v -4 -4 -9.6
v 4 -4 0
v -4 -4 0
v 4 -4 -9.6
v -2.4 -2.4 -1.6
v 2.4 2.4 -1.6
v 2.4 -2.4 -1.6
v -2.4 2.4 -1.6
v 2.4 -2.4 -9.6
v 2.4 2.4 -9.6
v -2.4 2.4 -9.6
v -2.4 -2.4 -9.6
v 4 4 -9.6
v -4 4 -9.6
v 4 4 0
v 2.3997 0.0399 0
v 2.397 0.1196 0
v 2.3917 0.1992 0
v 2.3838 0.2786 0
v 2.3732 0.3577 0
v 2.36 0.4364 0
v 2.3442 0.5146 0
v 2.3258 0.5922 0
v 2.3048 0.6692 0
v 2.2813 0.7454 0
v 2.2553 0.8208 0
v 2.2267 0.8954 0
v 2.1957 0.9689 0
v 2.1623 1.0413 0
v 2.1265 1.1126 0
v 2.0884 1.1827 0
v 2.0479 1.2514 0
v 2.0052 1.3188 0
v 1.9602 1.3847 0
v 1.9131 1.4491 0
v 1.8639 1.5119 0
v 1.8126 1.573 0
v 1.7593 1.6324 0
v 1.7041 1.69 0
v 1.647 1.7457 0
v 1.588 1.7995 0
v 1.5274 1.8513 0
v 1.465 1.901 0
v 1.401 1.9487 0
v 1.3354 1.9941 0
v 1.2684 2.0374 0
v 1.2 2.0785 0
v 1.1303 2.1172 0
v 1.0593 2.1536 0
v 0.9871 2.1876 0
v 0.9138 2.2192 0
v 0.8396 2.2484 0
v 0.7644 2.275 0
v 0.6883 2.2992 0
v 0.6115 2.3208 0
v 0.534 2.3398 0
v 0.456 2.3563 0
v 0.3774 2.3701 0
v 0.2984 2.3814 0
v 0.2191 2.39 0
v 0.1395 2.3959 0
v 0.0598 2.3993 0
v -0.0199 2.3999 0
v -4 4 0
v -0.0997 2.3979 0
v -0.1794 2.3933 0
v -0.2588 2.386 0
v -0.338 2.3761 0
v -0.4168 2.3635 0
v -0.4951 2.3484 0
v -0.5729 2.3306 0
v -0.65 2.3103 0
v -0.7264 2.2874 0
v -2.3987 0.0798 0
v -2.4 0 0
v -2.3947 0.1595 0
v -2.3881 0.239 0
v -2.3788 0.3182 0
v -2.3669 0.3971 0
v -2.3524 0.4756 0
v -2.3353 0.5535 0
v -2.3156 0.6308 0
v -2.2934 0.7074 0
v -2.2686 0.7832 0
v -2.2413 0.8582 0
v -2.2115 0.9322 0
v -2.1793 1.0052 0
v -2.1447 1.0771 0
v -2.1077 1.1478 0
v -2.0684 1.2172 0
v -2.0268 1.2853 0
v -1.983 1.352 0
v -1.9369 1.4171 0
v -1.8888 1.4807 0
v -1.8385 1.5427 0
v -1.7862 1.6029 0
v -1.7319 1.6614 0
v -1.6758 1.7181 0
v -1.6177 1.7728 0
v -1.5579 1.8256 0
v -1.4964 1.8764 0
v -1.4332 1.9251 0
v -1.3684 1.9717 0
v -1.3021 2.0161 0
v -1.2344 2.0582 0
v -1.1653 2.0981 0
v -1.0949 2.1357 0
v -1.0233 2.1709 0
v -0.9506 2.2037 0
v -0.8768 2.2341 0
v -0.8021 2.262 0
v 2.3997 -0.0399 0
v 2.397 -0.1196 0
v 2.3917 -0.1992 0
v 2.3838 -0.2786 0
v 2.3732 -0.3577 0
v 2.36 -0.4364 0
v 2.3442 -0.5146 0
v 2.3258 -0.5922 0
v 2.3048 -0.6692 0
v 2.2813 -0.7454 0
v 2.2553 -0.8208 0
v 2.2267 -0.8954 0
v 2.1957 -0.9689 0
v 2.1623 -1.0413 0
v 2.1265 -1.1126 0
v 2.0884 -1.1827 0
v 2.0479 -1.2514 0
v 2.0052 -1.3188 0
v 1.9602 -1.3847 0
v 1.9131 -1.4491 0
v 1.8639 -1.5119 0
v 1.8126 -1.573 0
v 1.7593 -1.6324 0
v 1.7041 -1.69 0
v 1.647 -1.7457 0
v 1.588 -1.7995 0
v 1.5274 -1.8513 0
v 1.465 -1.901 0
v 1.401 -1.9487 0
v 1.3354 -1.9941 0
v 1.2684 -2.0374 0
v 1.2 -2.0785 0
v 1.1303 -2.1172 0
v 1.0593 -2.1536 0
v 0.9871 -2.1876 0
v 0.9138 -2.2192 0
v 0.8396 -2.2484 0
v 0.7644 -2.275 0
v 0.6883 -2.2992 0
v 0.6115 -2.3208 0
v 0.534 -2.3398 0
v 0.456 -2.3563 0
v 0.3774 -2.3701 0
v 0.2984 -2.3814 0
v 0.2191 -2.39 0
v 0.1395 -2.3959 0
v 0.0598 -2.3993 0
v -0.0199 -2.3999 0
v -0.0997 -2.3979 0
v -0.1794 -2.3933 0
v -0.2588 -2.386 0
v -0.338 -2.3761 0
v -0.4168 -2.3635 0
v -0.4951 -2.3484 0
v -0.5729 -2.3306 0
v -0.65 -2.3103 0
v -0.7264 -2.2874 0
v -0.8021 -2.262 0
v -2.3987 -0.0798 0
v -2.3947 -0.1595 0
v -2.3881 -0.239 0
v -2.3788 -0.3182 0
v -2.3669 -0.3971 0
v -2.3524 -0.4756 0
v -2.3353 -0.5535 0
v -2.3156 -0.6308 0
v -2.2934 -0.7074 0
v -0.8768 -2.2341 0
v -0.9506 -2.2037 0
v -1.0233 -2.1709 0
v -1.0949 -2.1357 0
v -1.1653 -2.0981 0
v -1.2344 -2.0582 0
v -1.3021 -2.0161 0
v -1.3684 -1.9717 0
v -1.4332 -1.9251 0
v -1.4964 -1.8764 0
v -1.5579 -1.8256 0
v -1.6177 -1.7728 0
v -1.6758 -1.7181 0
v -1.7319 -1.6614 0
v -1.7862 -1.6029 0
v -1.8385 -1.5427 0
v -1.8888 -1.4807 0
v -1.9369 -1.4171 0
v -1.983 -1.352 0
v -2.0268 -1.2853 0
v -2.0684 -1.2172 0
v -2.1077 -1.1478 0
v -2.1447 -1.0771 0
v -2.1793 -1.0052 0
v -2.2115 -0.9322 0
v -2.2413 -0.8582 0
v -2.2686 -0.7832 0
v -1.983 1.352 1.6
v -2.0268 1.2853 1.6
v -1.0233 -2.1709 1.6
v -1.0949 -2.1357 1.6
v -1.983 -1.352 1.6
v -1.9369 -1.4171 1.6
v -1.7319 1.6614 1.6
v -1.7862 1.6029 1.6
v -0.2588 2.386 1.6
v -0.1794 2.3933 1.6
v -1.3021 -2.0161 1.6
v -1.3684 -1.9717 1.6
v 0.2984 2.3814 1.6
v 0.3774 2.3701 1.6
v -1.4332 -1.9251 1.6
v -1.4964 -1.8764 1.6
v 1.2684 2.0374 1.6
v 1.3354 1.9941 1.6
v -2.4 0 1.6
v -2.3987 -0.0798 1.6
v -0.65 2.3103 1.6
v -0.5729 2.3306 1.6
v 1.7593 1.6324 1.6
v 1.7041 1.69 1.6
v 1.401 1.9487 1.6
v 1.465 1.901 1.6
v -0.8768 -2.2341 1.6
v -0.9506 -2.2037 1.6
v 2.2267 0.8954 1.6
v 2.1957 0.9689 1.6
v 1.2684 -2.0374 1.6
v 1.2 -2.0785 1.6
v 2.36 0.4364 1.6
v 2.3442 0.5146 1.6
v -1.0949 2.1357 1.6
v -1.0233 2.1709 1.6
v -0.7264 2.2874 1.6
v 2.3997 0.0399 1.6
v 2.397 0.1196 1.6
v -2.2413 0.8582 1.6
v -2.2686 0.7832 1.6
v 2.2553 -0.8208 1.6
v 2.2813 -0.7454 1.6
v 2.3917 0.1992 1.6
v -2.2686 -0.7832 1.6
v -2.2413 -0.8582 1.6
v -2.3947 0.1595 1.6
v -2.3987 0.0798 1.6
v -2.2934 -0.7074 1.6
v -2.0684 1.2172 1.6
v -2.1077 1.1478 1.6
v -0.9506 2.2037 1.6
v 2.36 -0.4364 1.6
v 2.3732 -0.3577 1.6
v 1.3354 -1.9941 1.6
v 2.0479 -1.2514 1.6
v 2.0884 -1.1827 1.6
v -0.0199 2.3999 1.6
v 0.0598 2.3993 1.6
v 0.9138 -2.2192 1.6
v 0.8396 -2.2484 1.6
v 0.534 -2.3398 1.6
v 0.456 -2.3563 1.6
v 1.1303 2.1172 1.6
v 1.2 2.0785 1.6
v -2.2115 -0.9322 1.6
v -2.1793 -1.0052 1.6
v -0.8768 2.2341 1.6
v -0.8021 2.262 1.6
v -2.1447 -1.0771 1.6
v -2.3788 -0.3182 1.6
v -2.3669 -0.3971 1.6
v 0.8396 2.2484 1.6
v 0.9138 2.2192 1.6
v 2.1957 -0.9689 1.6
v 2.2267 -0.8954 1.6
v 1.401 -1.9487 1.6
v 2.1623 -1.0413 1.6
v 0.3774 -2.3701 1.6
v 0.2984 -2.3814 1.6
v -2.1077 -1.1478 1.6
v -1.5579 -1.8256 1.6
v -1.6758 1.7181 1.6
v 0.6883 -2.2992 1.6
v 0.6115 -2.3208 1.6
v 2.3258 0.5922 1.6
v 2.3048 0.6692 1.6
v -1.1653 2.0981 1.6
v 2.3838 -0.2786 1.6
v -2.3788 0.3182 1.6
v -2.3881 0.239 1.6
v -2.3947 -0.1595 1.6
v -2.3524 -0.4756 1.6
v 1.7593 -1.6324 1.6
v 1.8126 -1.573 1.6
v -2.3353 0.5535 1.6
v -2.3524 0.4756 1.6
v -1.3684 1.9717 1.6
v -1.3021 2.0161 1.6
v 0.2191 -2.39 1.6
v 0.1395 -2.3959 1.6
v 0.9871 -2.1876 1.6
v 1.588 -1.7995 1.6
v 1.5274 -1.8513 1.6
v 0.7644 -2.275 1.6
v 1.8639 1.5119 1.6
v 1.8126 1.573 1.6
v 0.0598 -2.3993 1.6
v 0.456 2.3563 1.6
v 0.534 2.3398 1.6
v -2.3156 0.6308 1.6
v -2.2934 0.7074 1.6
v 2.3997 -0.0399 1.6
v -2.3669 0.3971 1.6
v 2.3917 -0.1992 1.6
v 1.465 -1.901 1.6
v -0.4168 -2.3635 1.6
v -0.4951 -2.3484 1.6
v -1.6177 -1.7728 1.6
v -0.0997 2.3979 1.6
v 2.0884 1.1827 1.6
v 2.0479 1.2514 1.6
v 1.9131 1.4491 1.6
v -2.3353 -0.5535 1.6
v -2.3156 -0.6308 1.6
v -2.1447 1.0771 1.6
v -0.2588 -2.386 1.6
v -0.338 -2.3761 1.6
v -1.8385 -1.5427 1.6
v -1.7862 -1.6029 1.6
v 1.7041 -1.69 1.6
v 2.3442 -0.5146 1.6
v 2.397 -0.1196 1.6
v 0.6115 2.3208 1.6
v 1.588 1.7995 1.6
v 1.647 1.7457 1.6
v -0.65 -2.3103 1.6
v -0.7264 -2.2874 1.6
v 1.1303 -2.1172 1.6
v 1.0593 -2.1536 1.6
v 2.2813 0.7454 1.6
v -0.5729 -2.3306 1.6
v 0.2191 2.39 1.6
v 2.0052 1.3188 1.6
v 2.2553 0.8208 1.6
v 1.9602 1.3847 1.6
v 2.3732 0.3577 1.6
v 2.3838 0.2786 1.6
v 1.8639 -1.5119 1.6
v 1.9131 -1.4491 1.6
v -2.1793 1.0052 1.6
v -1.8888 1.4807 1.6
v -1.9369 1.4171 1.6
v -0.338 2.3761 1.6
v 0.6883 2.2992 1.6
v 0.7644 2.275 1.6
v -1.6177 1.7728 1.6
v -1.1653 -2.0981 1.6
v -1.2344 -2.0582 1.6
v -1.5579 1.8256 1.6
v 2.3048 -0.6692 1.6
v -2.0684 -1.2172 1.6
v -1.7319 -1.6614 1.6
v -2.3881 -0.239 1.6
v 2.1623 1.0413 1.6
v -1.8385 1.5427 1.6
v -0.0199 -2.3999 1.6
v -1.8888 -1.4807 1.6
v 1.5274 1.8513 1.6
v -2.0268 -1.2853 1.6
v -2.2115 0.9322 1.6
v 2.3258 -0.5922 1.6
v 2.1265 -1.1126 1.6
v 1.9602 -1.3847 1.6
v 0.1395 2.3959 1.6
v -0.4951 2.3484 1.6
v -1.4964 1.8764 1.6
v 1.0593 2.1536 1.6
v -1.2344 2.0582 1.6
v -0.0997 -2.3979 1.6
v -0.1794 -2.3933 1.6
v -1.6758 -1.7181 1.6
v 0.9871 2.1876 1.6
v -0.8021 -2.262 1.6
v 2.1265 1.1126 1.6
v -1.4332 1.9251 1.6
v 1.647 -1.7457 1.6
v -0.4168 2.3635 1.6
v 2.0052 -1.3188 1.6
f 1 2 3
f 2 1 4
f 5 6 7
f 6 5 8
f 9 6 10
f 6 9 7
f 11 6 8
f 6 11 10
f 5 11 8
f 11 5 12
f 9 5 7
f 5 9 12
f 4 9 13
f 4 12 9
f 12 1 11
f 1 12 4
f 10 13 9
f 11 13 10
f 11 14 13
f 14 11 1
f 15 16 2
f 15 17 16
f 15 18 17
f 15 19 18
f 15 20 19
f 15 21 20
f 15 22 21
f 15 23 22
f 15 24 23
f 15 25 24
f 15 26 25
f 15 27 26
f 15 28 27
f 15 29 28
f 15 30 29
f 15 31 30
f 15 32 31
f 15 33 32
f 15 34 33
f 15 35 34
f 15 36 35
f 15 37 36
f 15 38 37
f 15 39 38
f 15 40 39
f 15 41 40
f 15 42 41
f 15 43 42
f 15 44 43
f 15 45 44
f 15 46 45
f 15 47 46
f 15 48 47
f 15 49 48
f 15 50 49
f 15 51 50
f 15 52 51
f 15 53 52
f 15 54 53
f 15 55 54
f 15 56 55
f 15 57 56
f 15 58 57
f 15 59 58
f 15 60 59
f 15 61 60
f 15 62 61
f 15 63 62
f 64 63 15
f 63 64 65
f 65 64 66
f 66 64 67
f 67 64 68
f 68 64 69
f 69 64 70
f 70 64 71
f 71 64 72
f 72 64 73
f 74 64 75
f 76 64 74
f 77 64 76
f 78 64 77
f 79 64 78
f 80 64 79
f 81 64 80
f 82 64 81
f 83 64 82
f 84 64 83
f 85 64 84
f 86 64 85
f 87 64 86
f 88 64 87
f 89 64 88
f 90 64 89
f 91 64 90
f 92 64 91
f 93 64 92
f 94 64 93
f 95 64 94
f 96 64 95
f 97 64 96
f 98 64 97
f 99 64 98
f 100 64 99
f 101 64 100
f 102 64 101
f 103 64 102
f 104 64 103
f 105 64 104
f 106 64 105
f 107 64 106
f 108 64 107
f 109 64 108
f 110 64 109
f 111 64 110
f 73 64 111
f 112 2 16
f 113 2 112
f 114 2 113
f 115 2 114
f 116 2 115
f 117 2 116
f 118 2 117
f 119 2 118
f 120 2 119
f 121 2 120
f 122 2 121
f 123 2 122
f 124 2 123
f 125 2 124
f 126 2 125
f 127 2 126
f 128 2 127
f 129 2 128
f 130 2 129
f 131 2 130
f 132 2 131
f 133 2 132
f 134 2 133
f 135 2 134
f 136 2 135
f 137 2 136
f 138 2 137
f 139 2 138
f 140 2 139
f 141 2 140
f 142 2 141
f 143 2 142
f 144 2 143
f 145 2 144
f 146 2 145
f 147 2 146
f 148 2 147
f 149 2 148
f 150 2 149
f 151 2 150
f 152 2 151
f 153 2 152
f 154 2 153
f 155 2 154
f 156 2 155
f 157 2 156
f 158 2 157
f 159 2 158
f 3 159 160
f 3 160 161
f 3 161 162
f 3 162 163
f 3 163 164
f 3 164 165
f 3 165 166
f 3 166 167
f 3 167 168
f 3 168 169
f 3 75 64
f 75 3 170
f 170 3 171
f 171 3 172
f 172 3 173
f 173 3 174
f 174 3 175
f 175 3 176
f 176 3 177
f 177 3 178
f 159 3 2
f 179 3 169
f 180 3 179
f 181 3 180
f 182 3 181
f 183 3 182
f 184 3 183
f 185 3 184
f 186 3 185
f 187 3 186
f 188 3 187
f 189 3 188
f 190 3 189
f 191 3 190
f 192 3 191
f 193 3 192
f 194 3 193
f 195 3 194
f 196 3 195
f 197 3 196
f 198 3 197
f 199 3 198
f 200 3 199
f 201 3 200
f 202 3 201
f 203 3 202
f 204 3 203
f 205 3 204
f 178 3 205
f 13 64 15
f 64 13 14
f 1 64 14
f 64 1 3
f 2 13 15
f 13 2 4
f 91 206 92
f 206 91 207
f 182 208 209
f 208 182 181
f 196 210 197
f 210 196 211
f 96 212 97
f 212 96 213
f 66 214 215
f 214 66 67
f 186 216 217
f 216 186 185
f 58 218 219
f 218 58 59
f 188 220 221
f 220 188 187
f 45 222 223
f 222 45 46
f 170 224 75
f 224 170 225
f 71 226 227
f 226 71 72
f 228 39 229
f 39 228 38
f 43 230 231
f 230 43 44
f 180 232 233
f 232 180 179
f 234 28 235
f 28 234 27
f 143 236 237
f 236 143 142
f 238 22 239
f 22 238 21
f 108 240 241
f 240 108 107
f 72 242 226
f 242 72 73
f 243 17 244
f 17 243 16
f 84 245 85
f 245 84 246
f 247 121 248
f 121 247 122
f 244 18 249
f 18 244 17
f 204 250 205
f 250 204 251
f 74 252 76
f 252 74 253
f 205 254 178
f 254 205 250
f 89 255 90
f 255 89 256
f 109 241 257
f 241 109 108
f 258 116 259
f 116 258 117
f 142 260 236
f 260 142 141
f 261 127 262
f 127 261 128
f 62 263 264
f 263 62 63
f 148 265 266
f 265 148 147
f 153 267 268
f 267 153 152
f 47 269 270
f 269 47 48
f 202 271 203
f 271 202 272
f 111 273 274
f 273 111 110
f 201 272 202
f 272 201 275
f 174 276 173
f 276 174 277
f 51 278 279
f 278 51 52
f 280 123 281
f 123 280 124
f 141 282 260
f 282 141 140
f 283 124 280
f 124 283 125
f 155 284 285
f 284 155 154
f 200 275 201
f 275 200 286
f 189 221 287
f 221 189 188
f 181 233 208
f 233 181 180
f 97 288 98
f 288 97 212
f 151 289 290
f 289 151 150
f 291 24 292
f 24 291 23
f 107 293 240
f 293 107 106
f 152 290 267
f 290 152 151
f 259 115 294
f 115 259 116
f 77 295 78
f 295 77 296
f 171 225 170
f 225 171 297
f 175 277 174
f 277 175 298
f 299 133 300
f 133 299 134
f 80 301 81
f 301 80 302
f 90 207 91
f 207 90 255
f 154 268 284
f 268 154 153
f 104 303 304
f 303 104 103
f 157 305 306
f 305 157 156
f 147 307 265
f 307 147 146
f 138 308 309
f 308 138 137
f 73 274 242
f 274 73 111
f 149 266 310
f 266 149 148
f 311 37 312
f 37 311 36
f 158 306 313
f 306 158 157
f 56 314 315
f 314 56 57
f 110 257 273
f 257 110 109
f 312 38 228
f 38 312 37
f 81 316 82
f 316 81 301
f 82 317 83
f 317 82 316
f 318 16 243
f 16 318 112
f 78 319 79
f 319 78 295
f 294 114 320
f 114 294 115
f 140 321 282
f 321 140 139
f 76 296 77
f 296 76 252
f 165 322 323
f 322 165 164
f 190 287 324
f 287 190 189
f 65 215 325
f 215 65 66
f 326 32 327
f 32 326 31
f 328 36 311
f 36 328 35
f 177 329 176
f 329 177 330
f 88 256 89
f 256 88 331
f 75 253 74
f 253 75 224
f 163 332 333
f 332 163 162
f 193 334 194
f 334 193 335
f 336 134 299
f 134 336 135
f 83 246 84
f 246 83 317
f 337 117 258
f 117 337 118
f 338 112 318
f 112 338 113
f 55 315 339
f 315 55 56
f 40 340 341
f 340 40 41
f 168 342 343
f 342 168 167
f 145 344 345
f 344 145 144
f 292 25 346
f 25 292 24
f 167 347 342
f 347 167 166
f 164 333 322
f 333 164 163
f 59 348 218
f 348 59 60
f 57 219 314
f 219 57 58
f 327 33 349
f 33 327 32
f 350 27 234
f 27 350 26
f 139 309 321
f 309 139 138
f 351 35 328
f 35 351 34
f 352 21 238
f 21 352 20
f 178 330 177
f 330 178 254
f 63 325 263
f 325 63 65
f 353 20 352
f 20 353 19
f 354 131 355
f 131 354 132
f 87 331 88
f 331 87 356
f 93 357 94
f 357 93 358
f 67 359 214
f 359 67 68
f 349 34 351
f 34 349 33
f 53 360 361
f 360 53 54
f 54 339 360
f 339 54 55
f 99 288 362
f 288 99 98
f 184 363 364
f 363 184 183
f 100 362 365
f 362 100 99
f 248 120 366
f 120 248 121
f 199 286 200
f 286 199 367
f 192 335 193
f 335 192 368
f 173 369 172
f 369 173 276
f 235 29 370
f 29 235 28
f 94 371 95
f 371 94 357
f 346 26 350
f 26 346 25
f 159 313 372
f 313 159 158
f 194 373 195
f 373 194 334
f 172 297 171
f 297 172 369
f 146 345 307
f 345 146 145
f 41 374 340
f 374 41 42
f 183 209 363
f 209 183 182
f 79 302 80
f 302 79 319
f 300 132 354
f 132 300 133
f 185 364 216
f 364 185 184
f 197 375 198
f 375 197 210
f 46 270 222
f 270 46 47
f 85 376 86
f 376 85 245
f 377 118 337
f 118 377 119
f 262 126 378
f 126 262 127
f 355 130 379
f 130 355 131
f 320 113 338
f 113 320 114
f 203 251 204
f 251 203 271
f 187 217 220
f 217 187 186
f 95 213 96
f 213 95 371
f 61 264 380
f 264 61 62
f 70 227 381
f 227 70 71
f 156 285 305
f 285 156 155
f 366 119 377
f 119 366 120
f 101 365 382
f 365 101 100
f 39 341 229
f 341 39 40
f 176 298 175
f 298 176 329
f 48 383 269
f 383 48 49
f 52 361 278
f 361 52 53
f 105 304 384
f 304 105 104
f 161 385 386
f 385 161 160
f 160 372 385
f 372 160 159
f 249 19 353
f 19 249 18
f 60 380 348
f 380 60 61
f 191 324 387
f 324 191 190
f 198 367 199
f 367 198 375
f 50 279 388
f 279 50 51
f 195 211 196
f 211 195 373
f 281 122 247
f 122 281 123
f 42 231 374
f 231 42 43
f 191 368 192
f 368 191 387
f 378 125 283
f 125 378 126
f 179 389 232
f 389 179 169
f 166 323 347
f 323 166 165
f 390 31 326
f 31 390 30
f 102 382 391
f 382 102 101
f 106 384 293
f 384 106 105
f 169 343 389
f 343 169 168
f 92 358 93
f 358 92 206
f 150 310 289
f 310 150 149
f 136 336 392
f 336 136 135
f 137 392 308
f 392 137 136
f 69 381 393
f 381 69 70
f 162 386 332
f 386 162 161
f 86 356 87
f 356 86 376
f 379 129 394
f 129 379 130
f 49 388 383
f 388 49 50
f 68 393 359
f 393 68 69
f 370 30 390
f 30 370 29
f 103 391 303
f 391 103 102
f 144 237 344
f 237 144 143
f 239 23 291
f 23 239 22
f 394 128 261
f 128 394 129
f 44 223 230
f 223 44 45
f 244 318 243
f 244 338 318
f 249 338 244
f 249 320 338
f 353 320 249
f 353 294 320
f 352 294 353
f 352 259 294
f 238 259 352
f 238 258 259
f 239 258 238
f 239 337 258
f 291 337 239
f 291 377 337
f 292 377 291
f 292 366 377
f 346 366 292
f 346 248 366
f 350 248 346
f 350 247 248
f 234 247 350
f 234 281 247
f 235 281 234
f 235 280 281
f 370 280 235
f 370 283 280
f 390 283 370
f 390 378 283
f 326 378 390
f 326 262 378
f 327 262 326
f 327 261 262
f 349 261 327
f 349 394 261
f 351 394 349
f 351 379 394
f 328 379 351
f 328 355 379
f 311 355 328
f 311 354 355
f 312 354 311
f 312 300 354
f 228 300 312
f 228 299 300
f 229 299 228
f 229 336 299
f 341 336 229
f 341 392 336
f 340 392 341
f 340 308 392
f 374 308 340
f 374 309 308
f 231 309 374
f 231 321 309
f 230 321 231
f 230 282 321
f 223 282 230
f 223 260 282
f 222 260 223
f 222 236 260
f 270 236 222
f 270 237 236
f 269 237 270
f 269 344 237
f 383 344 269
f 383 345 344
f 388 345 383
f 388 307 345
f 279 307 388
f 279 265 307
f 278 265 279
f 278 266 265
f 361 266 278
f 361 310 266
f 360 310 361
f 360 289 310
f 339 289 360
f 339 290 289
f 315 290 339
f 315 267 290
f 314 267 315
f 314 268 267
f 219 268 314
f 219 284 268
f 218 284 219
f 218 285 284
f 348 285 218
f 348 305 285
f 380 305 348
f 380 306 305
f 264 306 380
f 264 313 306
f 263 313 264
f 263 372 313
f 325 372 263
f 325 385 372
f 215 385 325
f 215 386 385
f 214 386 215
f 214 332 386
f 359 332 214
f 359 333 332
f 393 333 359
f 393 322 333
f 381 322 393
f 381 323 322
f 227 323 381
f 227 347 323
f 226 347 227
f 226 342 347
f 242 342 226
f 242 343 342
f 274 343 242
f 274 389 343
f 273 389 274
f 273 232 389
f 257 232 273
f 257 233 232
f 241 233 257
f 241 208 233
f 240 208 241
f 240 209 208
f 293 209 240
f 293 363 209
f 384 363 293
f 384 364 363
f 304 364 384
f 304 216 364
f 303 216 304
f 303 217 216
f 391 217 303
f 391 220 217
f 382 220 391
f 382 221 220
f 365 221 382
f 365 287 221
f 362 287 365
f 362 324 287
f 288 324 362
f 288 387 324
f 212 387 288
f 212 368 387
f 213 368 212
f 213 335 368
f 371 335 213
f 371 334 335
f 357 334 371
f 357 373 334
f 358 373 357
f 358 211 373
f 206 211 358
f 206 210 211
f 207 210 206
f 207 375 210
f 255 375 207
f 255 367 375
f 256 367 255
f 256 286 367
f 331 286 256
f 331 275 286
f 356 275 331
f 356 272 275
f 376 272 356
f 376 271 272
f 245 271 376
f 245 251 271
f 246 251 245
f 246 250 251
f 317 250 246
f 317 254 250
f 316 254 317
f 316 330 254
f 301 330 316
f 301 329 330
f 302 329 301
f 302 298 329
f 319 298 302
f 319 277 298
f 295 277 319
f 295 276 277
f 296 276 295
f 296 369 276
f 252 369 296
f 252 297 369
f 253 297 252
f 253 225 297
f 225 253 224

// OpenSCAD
// file: ../p/4-4edge.scad
use <../lib.scad>
$fa=1; $fs=0.2;
function ldraw_lib__4_4edge(realsolid=false) = [
// 0 Circle 1.0
// 0 Name: 4-4edge.dat
// 0 Author: James Jessiman
// 0 !LDRAW_ORG Primitive UPDATE 2017-01
// 0 !LICENSE Licensed under CC BY 2.0 and CC BY 4.0 : see CAreadme.txt
// 
// 0 BFC CERTIFY CCW
  [0,"BFC","CERTIFY"],
  [0,"BFC","CCW"],
// 
// 0 !HISTORY 1998-12-15 [PTadmin] Official Update 1998-10
// 0 !HISTORY 2005-12-28 [PTadmin] Official Update 2005-01
// 0 !HISTORY 2007-06-24 [PTadmin] Header formatted for Contributor Agreement
// 0 !HISTORY 2008-07-01 [PTadmin] Official Update 2008-01
// 0 !HISTORY 2017-01-15 [Steffen] BFCed
// 0 !HISTORY 2017-12-30 [PTadmin] Official Update 2017-01
// 
// 
// 2 24 1 0 0 0.9239 0 0.3827
  [2,24,1,0,0,0.9239,0,0.3827],
// 2 24 0.9239 0 0.3827 0.7071 0 0.7071
  [2,24,0.9239,0,0.3827,0.7071,0,0.7071],
// 2 24 0.7071 0 0.7071 0.3827 0 0.9239
  [2,24,0.7071,0,0.7071,0.3827,0,0.9239],
// 2 24 0.3827 0 0.9239 0 0 1
  [2,24,0.3827,0,0.9239,0,0,1],
// 2 24 0 0 1 -0.3827 0 0.9239
  [2,24,0,0,1,-0.3827,0,0.9239],
// 2 24 -0.3827 0 0.9239 -0.7071 0 0.7071
  [2,24,-0.3827,0,0.9239,-0.7071,0,0.7071],
// 2 24 -0.7071 0 0.7071 -0.9239 0 0.3827
  [2,24,-0.7071,0,0.7071,-0.9239,0,0.3827],
// 2 24 -0.9239 0 0.3827 -1 0 -0
  [2,24,-0.9239,0,0.3827,-1,0,-0],
// 2 24 -1 0 -0 -0.9239 0 -0.3827
  [2,24,-1,0,-0,-0.9239,0,-0.3827],
// 2 24 -0.9239 0 -0.3827 -0.7071 0 -0.7071
  [2,24,-0.9239,0,-0.3827,-0.7071,0,-0.7071],
// 2 24 -0.7071 0 -0.7071 -0.3827 0 -0.9239
  [2,24,-0.7071,0,-0.7071,-0.3827,0,-0.9239],
// 2 24 -0.3827 0 -0.9239 0 0 -1
  [2,24,-0.3827,0,-0.9239,0,0,-1],
// 2 24 0 0 -1 0.3827 0 -0.9239
  [2,24,0,0,-1,0.3827,0,-0.9239],
// 2 24 0.3827 0 -0.9239 0.7071 0 -0.7071
  [2,24,0.3827,0,-0.9239,0.7071,0,-0.7071],
// 2 24 0.7071 0 -0.7071 0.9239 0 -0.3827
  [2,24,0.7071,0,-0.7071,0.9239,0,-0.3827],
// 2 24 0.9239 0 -0.3827 1 0 0
  [2,24,0.9239,0,-0.3827,1,0,0],
];
module ldraw_lib__4_4edge(step=0, col=false, unit=2/5, alt=false, line=0.2, solid=!$preview)
    makepoly(ldraw_lib__4_4edge(solid), step=step, col=col, unit=unit, alt=alt, line=line, solid=solid);
ldraw_lib__4_4edge(line=0.2);
// file: ../p/4-4disc.scad
use <../lib.scad>
$fa=1; $fs=0.2;
function ldraw_lib__4_4disc(realsolid=false) = [
// 0 Disc 1.0
// 0 Name: 4-4disc.dat
// 0 Author: James Jessiman
// 0 !LDRAW_ORG Primitive UPDATE 2002-02
// 0 !LICENSE Licensed under CC BY 2.0 and CC BY 4.0 : see CAreadme.txt
// 
// 0 BFC CERTIFY CCW
  [0,"BFC","CERTIFY"],
  [0,"BFC","CCW"],
// 
// 0 !HISTORY 1998-12-15 [PTadmin] Official Update 1998-10
// 0 !HISTORY 2002-03-23 [sbliss] Added BFC statement
// 0 !HISTORY 2002-04-25 [PTadmin] Official Update 2002-02
// 0 !HISTORY 2007-06-24 [PTadmin] Header formatted for Contributor Agreement
// 0 !HISTORY 2008-07-01 [PTadmin] Official Update 2008-01
// 
// 
// 3 16 0 0 0 1 0 0 0.9239 0 0.3827
  [3,16,0,0,0,1,0,0,0.9239,0,0.3827],
// 3 16 0 0 0 0.9239 0 0.3827 0.7071 0 0.7071
  [3,16,0,0,0,0.9239,0,0.3827,0.7071,0,0.7071],
// 3 16 0 0 0 0.7071 0 0.7071 0.3827 0 0.9239
  [3,16,0,0,0,0.7071,0,0.7071,0.3827,0,0.9239],
// 3 16 0 0 0 0.3827 0 0.9239 0 0 1
  [3,16,0,0,0,0.3827,0,0.9239,0,0,1],
// 3 16 0 0 0 0 0 1 -0.3827 0 0.9239
  [3,16,0,0,0,0,0,1,-0.3827,0,0.9239],
// 3 16 0 0 0 -0.3827 0 0.9239 -0.7071 0 0.7071
  [3,16,0,0,0,-0.3827,0,0.9239,-0.7071,0,0.7071],
// 3 16 0 0 0 -0.7071 0 0.7071 -0.9239 0 0.3827
  [3,16,0,0,0,-0.7071,0,0.7071,-0.9239,0,0.3827],
// 3 16 0 0 0 -0.9239 0 0.3827 -1 0 -0
  [3,16,0,0,0,-0.9239,0,0.3827,-1,0,-0],
// 3 16 0 0 0 -1 0 -0 -0.9239 0 -0.3827
  [3,16,0,0,0,-1,0,-0,-0.9239,0,-0.3827],
// 3 16 0 0 0 -0.9239 0 -0.3827 -0.7071 0 -0.7071
  [3,16,0,0,0,-0.9239,0,-0.3827,-0.7071,0,-0.7071],
// 3 16 0 0 0 -0.7071 0 -0.7071 -0.3827 0 -0.9239
  [3,16,0,0,0,-0.7071,0,-0.7071,-0.3827,0,-0.9239],
// 3 16 0 0 0 -0.3827 0 -0.9239 0 0 -1
  [3,16,0,0,0,-0.3827,0,-0.9239,0,0,-1],
// 3 16 0 0 0 0 0 -1 0.3827 0 -0.9239
  [3,16,0,0,0,0,0,-1,0.3827,0,-0.9239],
// 3 16 0 0 0 0.3827 0 -0.9239 0.7071 0 -0.7071
  [3,16,0,0,0,0.3827,0,-0.9239,0.7071,0,-0.7071],
// 3 16 0 0 0 0.7071 0 -0.7071 0.9239 0 -0.3827
  [3,16,0,0,0,0.7071,0,-0.7071,0.9239,0,-0.3827],
// 3 16 0 0 0 0.9239 0 -0.3827 1 0 0
  [3,16,0,0,0,0.9239,0,-0.3827,1,0,0],
// 0
];
module ldraw_lib__4_4disc(step=0, col=false, unit=2/5, alt=false, line=0.2, solid=!$preview)
    makepoly(ldraw_lib__4_4disc(solid), step=step, col=col, unit=unit, alt=alt, line=line, solid=solid);
ldraw_lib__4_4disc(line=0.2);
// file: ../p/4-4cyli.scad
use <../lib.scad>
$fa=1; $fs=0.2;
function ldraw_lib__4_4cyli(realsolid=false) = [
// 0 Cylinder 1.0
// 0 Name: 4-4cyli.dat
// 0 Author: James Jessiman
// 0 !LDRAW_ORG Primitive UPDATE 2005-01
// 0 !LICENSE Licensed under CC BY 2.0 and CC BY 4.0 : see CAreadme.txt
// 
// 0 BFC CERTIFY CCW
  [0,"BFC","CERTIFY"],
  [0,"BFC","CCW"],
// 
// 0 !HISTORY 1998-12-15 [PTadmin] Official Update 1998-10
// 0 !HISTORY 2002-03-23 [sbliss] Added BFC statement; merged headers from files in distributions LDraw 0.27 and Complete.
// 0 !HISTORY 2002-04-25 [PTadmin] Official Update 2002-02
// 0 !HISTORY 2004-12-14 [guyvivan] BFC CCW
// 0 !HISTORY 2005-12-28 [PTadmin] Official Update 2005-01
// 0 !HISTORY 2007-06-24 [PTadmin] Header formatted for Contributor Agreement
// 0 !HISTORY 2008-07-01 [PTadmin] Official Update 2008-01
// 
// 
// 4 16 1 1 0 0.9239 1 0.3827 0.9239 0 0.3827 1 0 0
  [4,16,1,1,0,0.9239,1,0.3827,0.9239,0,0.3827,1,0,0],
// 5 24 1 0 0 1 1 0 0.9239 0 0.3827 0.9239 0 -0.3827
  [5,24,1,0,0,1,1,0,0.9239,0,0.3827,0.9239,0,-0.3827],
// 4 16 0.9239 1 0.3827 0.7071 1 0.7071 0.7071 0 0.7071 0.9239 0 0.3827
  [4,16,0.9239,1,0.3827,0.7071,1,0.7071,0.7071,0,0.7071,0.9239,0,0.3827],
// 5 24 0.9239 0 0.3827 0.9239 1 0.3827 0.7071 0 0.7071 1 0 0
  [5,24,0.9239,0,0.3827,0.9239,1,0.3827,0.7071,0,0.7071,1,0,0],
// 4 16 0.7071 1 0.7071 0.3827 1 0.9239 0.3827 0 0.9239 0.7071 0 0.7071
  [4,16,0.7071,1,0.7071,0.3827,1,0.9239,0.3827,0,0.9239,0.7071,0,0.7071],
// 5 24 0.7071 0 0.7071 0.7071 1 0.7071 0.3827 0 0.9239 0.9239 0 0.3827
  [5,24,0.7071,0,0.7071,0.7071,1,0.7071,0.3827,0,0.9239,0.9239,0,0.3827],
// 4 16 0.3827 1 0.9239 0 1 1 0 0 1 0.3827 0 0.9239
  [4,16,0.3827,1,0.9239,0,1,1,0,0,1,0.3827,0,0.9239],
// 5 24 0.3827 0 0.9239 0.3827 1 0.9239 0 0 1 0.7071 0 0.7071
  [5,24,0.3827,0,0.9239,0.3827,1,0.9239,0,0,1,0.7071,0,0.7071],
// 4 16 0 1 1 -0.3827 1 0.9239 -0.3827 0 0.9239 0 0 1
  [4,16,0,1,1,-0.3827,1,0.9239,-0.3827,0,0.9239,0,0,1],
// 5 24 0 0 1 0 1 1 -0.3827 0 0.9239 0.3827 0 0.9239
  [5,24,0,0,1,0,1,1,-0.3827,0,0.9239,0.3827,0,0.9239],
// 4 16 -0.3827 1 0.9239 -0.7071 1 0.7071 -0.7071 0 0.7071 -0.3827 0 0.9239
  [4,16,-0.3827,1,0.9239,-0.7071,1,0.7071,-0.7071,0,0.7071,-0.3827,0,0.9239],
// 5 24 -0.3827 0 0.9239 -0.3827 1 0.9239 -0.7071 0 0.7071 0 0 1
  [5,24,-0.3827,0,0.9239,-0.3827,1,0.9239,-0.7071,0,0.7071,0,0,1],
// 4 16 -0.7071 1 0.7071 -0.9239 1 0.3827 -0.9239 0 0.3827 -0.7071 0 0.7071
  [4,16,-0.7071,1,0.7071,-0.9239,1,0.3827,-0.9239,0,0.3827,-0.7071,0,0.7071],
// 5 24 -0.7071 0 0.7071 -0.7071 1 0.7071 -0.9239 0 0.3827 -0.3827 0 0.9239
  [5,24,-0.7071,0,0.7071,-0.7071,1,0.7071,-0.9239,0,0.3827,-0.3827,0,0.9239],
// 4 16 -0.9239 1 0.3827 -1 1 0 -1 0 0 -0.9239 0 0.3827
  [4,16,-0.9239,1,0.3827,-1,1,0,-1,0,0,-0.9239,0,0.3827],
// 5 24 -0.9239 0 0.3827 -0.9239 1 0.3827 -1 0 0 -0.7071 0 0.7071
  [5,24,-0.9239,0,0.3827,-0.9239,1,0.3827,-1,0,0,-0.7071,0,0.7071],
// 4 16 -1 1 0 -0.9239 1 -0.3827 -0.9239 0 -0.3827 -1 0 0
  [4,16,-1,1,0,-0.9239,1,-0.3827,-0.9239,0,-0.3827,-1,0,0],
// 5 24 -1 0 0 -1 1 0 -0.9239 0 -0.3827 -0.9239 0 0.3827
  [5,24,-1,0,0,-1,1,0,-0.9239,0,-0.3827,-0.9239,0,0.3827],
// 4 16 -0.9239 1 -0.3827 -0.7071 1 -0.7071 -0.7071 0 -0.7071 -0.9239 0 -0.3827
  [4,16,-0.9239,1,-0.3827,-0.7071,1,-0.7071,-0.7071,0,-0.7071,-0.9239,0,-0.3827],
// 5 24 -0.9239 0 -0.3827 -0.9239 1 -0.3827 -0.7071 0 -0.7071 -1 0 0
  [5,24,-0.9239,0,-0.3827,-0.9239,1,-0.3827,-0.7071,0,-0.7071,-1,0,0],
// 4 16 -0.7071 1 -0.7071 -0.3827 1 -0.9239 -0.3827 0 -0.9239 -0.7071 0 -0.7071
  [4,16,-0.7071,1,-0.7071,-0.3827,1,-0.9239,-0.3827,0,-0.9239,-0.7071,0,-0.7071],
// 5 24 -0.7071 0 -0.7071 -0.7071 1 -0.7071 -0.3827 0 -0.9239 -0.9239 0 -0.3827
  [5,24,-0.7071,0,-0.7071,-0.7071,1,-0.7071,-0.3827,0,-0.9239,-0.9239,0,-0.3827],
// 4 16 -0.3827 1 -0.9239 0 1 -1 0 0 -1 -0.3827 0 -0.9239
  [4,16,-0.3827,1,-0.9239,0,1,-1,0,0,-1,-0.3827,0,-0.9239],
// 5 24 -0.3827 0 -0.9239 -0.3827 1 -0.9239 0 0 -1 -0.7071 0 -0.7071
  [5,24,-0.3827,0,-0.9239,-0.3827,1,-0.9239,0,0,-1,-0.7071,0,-0.7071],
// 4 16 0 1 -1 0.3827 1 -0.9239 0.3827 0 -0.9239 0 0 -1
  [4,16,0,1,-1,0.3827,1,-0.9239,0.3827,0,-0.9239,0,0,-1],
// 5 24 0 0 -1 0 1 -1 0.3827 0 -0.9239 -0.3827 0 -0.9239
  [5,24,0,0,-1,0,1,-1,0.3827,0,-0.9239,-0.3827,0,-0.9239],
// 4 16 0.3827 1 -0.9239 0.7071 1 -0.7071 0.7071 0 -0.7071 0.3827 0 -0.9239
  [4,16,0.3827,1,-0.9239,0.7071,1,-0.7071,0.7071,0,-0.7071,0.3827,0,-0.9239],
// 5 24 0.3827 0 -0.9239 0.3827 1 -0.9239 0.7071 0 -0.7071 0 0 -1
  [5,24,0.3827,0,-0.9239,0.3827,1,-0.9239,0.7071,0,-0.7071,0,0,-1],
// 4 16 0.7071 1 -0.7071 0.9239 1 -0.3827 0.9239 0 -0.3827 0.7071 0 -0.7071
  [4,16,0.7071,1,-0.7071,0.9239,1,-0.3827,0.9239,0,-0.3827,0.7071,0,-0.7071],
// 5 24 0.7071 0 -0.7071 0.7071 1 -0.7071 0.9239 0 -0.3827 0.3827 0 -0.9239
  [5,24,0.7071,0,-0.7071,0.7071,1,-0.7071,0.9239,0,-0.3827,0.3827,0,-0.9239],
// 4 16 0.9239 1 -0.3827 1 1 0 1 0 0 0.9239 0 -0.3827
  [4,16,0.9239,1,-0.3827,1,1,0,1,0,0,0.9239,0,-0.3827],
// 5 24 0.9239 0 -0.3827 0.9239 1 -0.3827 1 0 0 0.7071 0 -0.7071
  [5,24,0.9239,0,-0.3827,0.9239,1,-0.3827,1,0,0,0.7071,0,-0.7071],
// 0
];
module ldraw_lib__4_4cyli(step=0, col=false, unit=2/5, alt=false, line=0.2, solid=!$preview)
    makepoly(ldraw_lib__4_4cyli(solid), step=step, col=col, unit=unit, alt=alt, line=line, solid=solid);
ldraw_lib__4_4cyli(line=0.2);
// file: ../p/stud3.scad
use <../lib.scad>
use <4-4cyli.scad>
use <4-4disc.scad>
use <4-4edge.scad>
$fa=1; $fs=0.2;
function ldraw_lib__stud3(realsolid=false) = realsolid ? 
    [openscad(translate([0,0,-eps()], o=cylinder(4+eps(), r=4)),2)] : [
// 0 Stud Tube Solid
// 0 Name: stud3.dat
// 0 Author: James Jessiman
// 0 !LDRAW_ORG Primitive UPDATE 2012-01
// 0 !LICENSE Licensed under CC BY 2.0 and CC BY 4.0 : see CAreadme.txt
// 
// 0 BFC CERTIFY CCW
  [0,"BFC","CERTIFY"],
  [0,"BFC","CCW"],
// 
// 0 !HISTORY 2002-04-04 [sbliss] Modified for BFC compliance
// 0 !HISTORY 2002-04-25 [PTadmin] Official Update 2002-02
// 0 !HISTORY 2007-06-24 [PTadmin] Header formatted for Contributor Agreement
// 0 !HISTORY 2008-07-01 [PTadmin] Official Update 2008-01
// 0 !HISTORY 2012-02-16 [Philo] Changed to CCW
// 0 !HISTORY 2012-03-30 [PTadmin] Official Update 2012-01
// 
// 
// 1 16 0 -4 0 4 0 0 0 1 0 0 0 4 4-4edge.dat
  [1,16,0,-4,0,4,0,0,0,1,0,0,0,4, ldraw_lib__4_4edge(realsolid)],
// 1 16 0 0 0 4 0 0 0 1 0 0 0 4 4-4edge.dat
  [1,16,0,0,0,4,0,0,0,1,0,0,0,4, ldraw_lib__4_4edge(realsolid)],
// 1 16 0 -4 0 4 0 0 0 1 0 0 0 4 4-4disc.dat
  [1,16,0,-4,0,4,0,0,0,1,0,0,0,4, ldraw_lib__4_4disc(realsolid)],
// 1 16 0 -4 0 4 0 0 0 4 0 0 0 4 4-4cyli.dat
  [1,16,0,-4,0,4,0,0,0,4,0,0,0,4, ldraw_lib__4_4cyli(realsolid)],
];
module ldraw_lib__stud3(step=0, col=false, unit=2/5, alt=false, line=0.2, solid=!$preview)
    makepoly(ldraw_lib__stud3(solid), step=step, col=col, unit=unit, alt=alt, line=line, solid=solid);
ldraw_lib__stud3(line=0.2);
// file: ../p/stud.scad
use <../lib.scad>
use <4-4cyli.scad>
use <4-4disc.scad>
use <4-4edge.scad>
$fa=1; $fs=0.2;
function ldraw_lib__stud(realsolid=false) = realsolid ? 
    [openscad(translate([0,0,-eps()], o=cylinder(4+eps(), r=6)),2)] : [
// 0 Stud
// 0 Name: stud.dat
// 0 Author: James Jessiman
// 0 !LDRAW_ORG Primitive UPDATE 2012-01
// 0 !LICENSE Licensed under CC BY 2.0 and CC BY 4.0 : see CAreadme.txt
// 
// 0 BFC CERTIFY CCW
  [0,"BFC","CERTIFY"],
  [0,"BFC","CCW"],
// 
// 0 !HISTORY 2002-04-04 [sbliss] Modified for BFC compliance
// 0 !HISTORY 2002-04-25 [PTadmin] Official Update 2002-02
// 0 !HISTORY 2007-06-24 [PTadmin] Header formatted for Contributor Agreement
// 0 !HISTORY 2008-07-01 [PTadmin] Official Update 2008-01
// 0 !HISTORY 2012-02-16 [Philo] Changed to CCW
// 0 !HISTORY 2012-03-30 [PTadmin] Official Update 2012-01
// 
// 
// 1 16 0 0 0 6 0 0 0 1 0 0 0 6 4-4edge.dat
  [1,16,0,0,0,6,0,0,0,1,0,0,0,6, ldraw_lib__4_4edge(realsolid)],
// 1 16 0 -4 0 6 0 0 0 1 0 0 0 6 4-4edge.dat
  [1,16,0,-4,0,6,0,0,0,1,0,0,0,6, ldraw_lib__4_4edge(realsolid)],
// 1 16 0 0 0 6 0 0 0 -4 0 0 0 6 4-4cyli.dat
  [1,16,0,0,0,6,0,0,0,-4,0,0,0,6, ldraw_lib__4_4cyli(realsolid)],
// 1 16 0 -4 0 6 0 0 0 1 0 0 0 6 4-4disc.dat
  [1,16,0,-4,0,6,0,0,0,1,0,0,0,6, ldraw_lib__4_4disc(realsolid)],
];
module ldraw_lib__stud(step=0, col=false, unit=2/5, alt=false, line=0.2, solid=!$preview)
    makepoly(ldraw_lib__stud(solid), step=step, col=col, unit=unit, alt=alt, line=line, solid=solid);
ldraw_lib__stud(line=0.2);
// file: ../p/box5.scad
use <../lib.scad>
$fa=1; $fs=0.2;
function ldraw_lib__box5(realsolid=false) = [
// 0 Box with 5 Faces and All Edges
// 0 Name: box5.dat
// 0 Author: James Jessiman
// 0 !LDRAW_ORG Primitive UPDATE 2012-01
// 0 !LICENSE Licensed under CC BY 2.0 and CC BY 4.0 : see CAreadme.txt
// 
// 0 BFC CERTIFY CCW
  [0,"BFC","CERTIFY"],
  [0,"BFC","CCW"],
// 
// 0 !HISTORY 2002-04-03 [sbliss] Modified for BFC compliance
// 0 !HISTORY 2002-04-25 [PTadmin] Official Update 2002-02
// 0 !HISTORY 2007-06-24 [PTadmin] Header formatted for Contributor Agreement
// 0 !HISTORY 2008-07-01 [PTadmin] Official Update 2008-01
// 0 !HISTORY 2012-02-16 [Philo] Changed to CCW
// 0 !HISTORY 2012-03-30 [PTadmin] Official Update 2012-01
// 
// 
// 2 24 1 1 1 -1 1 1
  [2,24,1,1,1,-1,1,1],
// 2 24 -1 1 1 -1 1 -1
  [2,24,-1,1,1,-1,1,-1],
// 2 24 -1 1 -1 1 1 -1
  [2,24,-1,1,-1,1,1,-1],
// 2 24 1 1 -1 1 1 1
  [2,24,1,1,-1,1,1,1],
// 2 24 1 0 1 -1 0 1
  [2,24,1,0,1,-1,0,1],
// 2 24 -1 0 1 -1 0 -1
  [2,24,-1,0,1,-1,0,-1],
// 2 24 -1 0 -1 1 0 -1
  [2,24,-1,0,-1,1,0,-1],
// 2 24 1 0 -1 1 0 1
  [2,24,1,0,-1,1,0,1],
// 2 24 1 0 1 1 1 1
  [2,24,1,0,1,1,1,1],
// 2 24 -1 0 1 -1 1 1
  [2,24,-1,0,1,-1,1,1],
// 2 24 1 0 -1 1 1 -1
  [2,24,1,0,-1,1,1,-1],
// 2 24 -1 0 -1 -1 1 -1
  [2,24,-1,0,-1,-1,1,-1],
// 4 16 -1 1 1 1 1 1 1 1 -1 -1 1 -1
  [4,16,-1,1,1,1,1,1,1,1,-1,-1,1,-1],
// 4 16 -1 1 1 -1 0 1 1 0 1 1 1 1
  [4,16,-1,1,1,-1,0,1,1,0,1,1,1,1],
// 4 16 -1 1 -1 -1 0 -1 -1 0 1 -1 1 1
  [4,16,-1,1,-1,-1,0,-1,-1,0,1,-1,1,1],
// 4 16 1 1 -1 1 0 -1 -1 0 -1 -1 1 -1
  [4,16,1,1,-1,1,0,-1,-1,0,-1,-1,1,-1],
// 4 16 1 1 1 1 0 1 1 0 -1 1 1 -1
  [4,16,1,1,1,1,0,1,1,0,-1,1,1,-1],
];
module ldraw_lib__box5(step=0, col=false, unit=2/5, alt=false, line=0.2, solid=!$preview)
    makepoly(ldraw_lib__box5(solid), step=step, col=col, unit=unit, alt=alt, line=line, solid=solid);
ldraw_lib__box5(line=0.2);
// file: ../p/box4t.scad
use <../lib.scad>
$fa=1; $fs=0.2;
function ldraw_lib__box4t(realsolid=false) = [
// 0 Box with 4 Adjacent Faces and All Edges
// 0 Name: box4t.dat
// 0 Author: Tore Eriksson [Tore_Eriksson]
// 0 !LDRAW_ORG Primitive UPDATE 2003-02
// 0 !LICENSE Licensed under CC BY 2.0 and CC BY 4.0 : see CAreadme.txt
// 
// 0 BFC CERTIFY CCW
  [0,"BFC","CERTIFY"],
  [0,"BFC","CCW"],
// 
// 0 !HISTORY 1997-09-29 [PTadmin] Official Update 1997-15
// 0 !HISTORY 2002-08-31 [izanette] Modified with WINDZ for BFC compliance
// 0 !HISTORY 2003-08-01 [PTadmin] Official Update 2003-02
// 0 !HISTORY 2007-06-24 [PTadmin] Header formatted for Contributor Agreement
// 0 !HISTORY 2008-07-01 [PTadmin] Official Update 2008-01
// 
// 
// 2 24 1 1 1 -1 1 1
  [2,24,1,1,1,-1,1,1],
// 2 24 -1 1 1 -1 1 -1
  [2,24,-1,1,1,-1,1,-1],
// 2 24 -1 1 -1 1 1 -1
  [2,24,-1,1,-1,1,1,-1],
// 2 24 1 1 -1 1 1 1
  [2,24,1,1,-1,1,1,1],
// 2 24 1 0 1 -1 0 1
  [2,24,1,0,1,-1,0,1],
// 2 24 -1 0 1 -1 0 -1
  [2,24,-1,0,1,-1,0,-1],
// 2 24 -1 0 -1 1 0 -1
  [2,24,-1,0,-1,1,0,-1],
// 2 24 1 0 -1 1 0 1
  [2,24,1,0,-1,1,0,1],
// 2 24 1 0 1 1 1 1
  [2,24,1,0,1,1,1,1],
// 2 24 -1 0 1 -1 1 1
  [2,24,-1,0,1,-1,1,1],
// 2 24 1 0 -1 1 1 -1
  [2,24,1,0,-1,1,1,-1],
// 2 24 -1 0 -1 -1 1 -1
  [2,24,-1,0,-1,-1,1,-1],
// 4 16 1 1 1 1 1 -1 -1 1 -1 -1 1 1
  [4,16,1,1,1,1,1,-1,-1,1,-1,-1,1,1],
// 4 16 1 1 1 -1 1 1 -1 0 1 1 0 1
  [4,16,1,1,1,-1,1,1,-1,0,1,1,0,1],
// 4 16 -1 1 1 -1 1 -1 -1 0 -1 -1 0 1
  [4,16,-1,1,1,-1,1,-1,-1,0,-1,-1,0,1],
// 0 4 16 -1 1 -1 -1 0 -1 1 0 -1 1 1 -1
// 4 16 1 1 -1 1 1 1 1 0 1 1 0 -1
  [4,16,1,1,-1,1,1,1,1,0,1,1,0,-1],
// 0
];
module ldraw_lib__box4t(step=0, col=false, unit=2/5, alt=false, line=0.2, solid=!$preview)
    makepoly(ldraw_lib__box4t(solid), step=step, col=col, unit=unit, alt=alt, line=line, solid=solid);
ldraw_lib__box4t(line=0.2);
// file: s/3004s01.scad
use <../../lib.scad>
use <../../p/box4t.scad>
use <../../p/box5.scad>
use <../../p/stud.scad>
use <../../p/stud3.scad>
$fa=1; $fs=0.2;
function ldraw_lib__s__3004s01(realsolid=false) = [
// 0 ~Brick  1 x  2 without Front Face
// 0 Name: s\3004s01.dat
// 0 Author: James Jessiman
// 0 !LDRAW_ORG Subpart UPDATE 2003-03
// 0 !LICENSE Licensed under CC BY 2.0 and CC BY 4.0 : see CAreadme.txt
// 
// 0 BFC CERTIFY CCW
  [0,"BFC","CERTIFY"],
  [0,"BFC","CCW"],
// 
// 0 !HISTORY 2003-09-07 [jriley] Subfiling, BFC
// 0 !HISTORY 2003-12-19 [PTadmin] Official Update 2003-03
// 0 !HISTORY 2007-08-29 [PTadmin] Header formatted for Contributor Agreement
// 0 !HISTORY 2008-07-01 [PTadmin] Official Update 2008-01
// 
// 
// 1 16 0 4 0 1 0 0 0 -5 0 0 0 1 stud3.dat
  [1,16,0,4,0,1,0,0,0,-5,0,0,0,1, ldraw_lib__stud3(realsolid)],
// 0 BFC INVERTNEXT
  [0,"BFC","INVERTNEXT"],
// 1 16 0 24 0 16 0 0 0 -20 0 0 0 6 box5.dat
  [1,16,0,24,0,16,0,0,0,-20,0,0,0,6, ldraw_lib__box5(realsolid)],
// 4 16 20 24 10 16 24 6 -16 24 6 -20 24 10
  [4,16,20,24,10,16,24,6,-16,24,6,-20,24,10],
// 4 16 -20 24 10 -16 24 6 -16 24 -6 -20 24 -10
  [4,16,-20,24,10,-16,24,6,-16,24,-6,-20,24,-10],
// 4 16 -20 24 -10 -16 24 -6 16 24 -6 20 24 -10
  [4,16,-20,24,-10,-16,24,-6,16,24,-6,20,24,-10],
// 4 16 20 24 -10 16 24 -6 16 24 6 20 24 10
  [4,16,20,24,-10,16,24,-6,16,24,6,20,24,10],
// 1 16 0 24 0 20 0 0 0 -24 0 0 0 10 box4t.dat
  [1,16,0,24,0,20,0,0,0,-24,0,0,0,10, ldraw_lib__box4t(realsolid)],
// 1 16 10 0 0 1 0 0 0 1 0 0 0 1 stud.dat
  [1,16,10,0,0,1,0,0,0,1,0,0,0,1, ldraw_lib__stud(realsolid)],
// 1 16 -10 0 0 1 0 0 0 1 0 0 0 1 stud.dat
  [1,16,-10,0,0,1,0,0,0,1,0,0,0,1, ldraw_lib__stud(realsolid)],
// 0
];
module ldraw_lib__s__3004s01(step=0, col=false, unit=2/5, alt=false, line=0.2, solid=!$preview)
    makepoly(ldraw_lib__s__3004s01(solid), step=step, col=col, unit=unit, alt=alt, line=line, solid=solid);
ldraw_lib__s__3004s01(line=0.2);
// file: s/3005s01.scad
use <../../lib.scad>
use <../../p/box4t.scad>
use <../../p/box5.scad>
use <../../p/stud.scad>
$fa=1; $fs=0.2;
function ldraw_lib__s__3005s01(realsolid=false) = [
// 0 ~Brick  1 x  1 without Front Face
// 0 Name: s\3005s01.dat
// 0 Author: John Riley [jriley]
// 0 !LDRAW_ORG Subpart UPDATE 2004-01
// 0 !LICENSE Licensed under CC BY 2.0 and CC BY 4.0 : see CAreadme.txt
// 
// 0 BFC CERTIFY CCW
  [0,"BFC","CERTIFY"],
  [0,"BFC","CCW"],
// 
// 0 !HISTORY 2003-09-07 [jriley] BFCed & Subfiled
// 0 !HISTORY 2004-03-02 [PTadmin] Official Update 2004-01
// 0 !HISTORY 2007-08-29 [PTadmin] Header formatted for Contributor Agreement
// 0 !HISTORY 2008-07-01 [PTadmin] Official Update 2008-01
// 
// 
// 0 BFC INVERTNEXT
  [0,"BFC","INVERTNEXT"],
// 1 16 0 24 0 0 0 6 0 -20 0 -6 0 0 box5.dat
  [1,16,0,24,0,0,0,6,0,-20,0,-6,0,0, ldraw_lib__box5(realsolid)],
// 4 16 10 24 -10 6 24 -6 6 24 6 10 24 10
  [4,16,10,24,-10,6,24,-6,6,24,6,10,24,10],
// 4 16 10 24 10 6 24 6 -6 24 6 -10 24 10
  [4,16,10,24,10,6,24,6,-6,24,6,-10,24,10],
// 4 16 -10 24 10 -6 24 6 -6 24 -6 -10 24 -10
  [4,16,-10,24,10,-6,24,6,-6,24,-6,-10,24,-10],
// 4 16 -10 24 -10 -6 24 -6 6 24 -6 10 24 -10
  [4,16,-10,24,-10,-6,24,-6,6,24,-6,10,24,-10],
// 1 16 0 24 0 10 0 0 0 -24 0 0 0 10 box4t.dat
  [1,16,0,24,0,10,0,0,0,-24,0,0,0,10, ldraw_lib__box4t(realsolid)],
// 1 16 0 0 0 0 0 1 0 1 0 -1 0 0 stud.dat
  [1,16,0,0,0,0,0,1,0,1,0,-1,0,0, ldraw_lib__stud(realsolid)],
// 0
];
module ldraw_lib__s__3005s01(step=0, col=false, unit=2/5, alt=false, line=0.2, solid=!$preview)
    makepoly(ldraw_lib__s__3005s01(solid), step=step, col=col, unit=unit, alt=alt, line=line, solid=solid);
ldraw_lib__s__3005s01(line=0.2);
// file: 3004.scad
use <../lib.scad>
use <s/3004s01.scad>
$fa=1; $fs=0.2;
function ldraw_lib__3004(realsolid=false) = [
// 0 Brick  1 x  2
// 0 Name: 3004.dat
// 0 Author: James Jessiman
// 0 !LDRAW_ORG Part UPDATE 2022-05
// 0 !LICENSE Licensed under CC BY 2.0 and CC BY 4.0 : see CAreadme.txt
// 
// 0 BFC CERTIFY CCW
  [0,"BFC","CERTIFY"],
  [0,"BFC","CCW"],
// 
// 0 !HISTORY 2001-10-26 [PTadmin] Official Update 2001-01
// 0 !HISTORY 2002-05-07 {unknown} BFC Certification
// 0 !HISTORY 2002-06-11 [PTadmin] Official Update 2002-03
// 0 !HISTORY 2007-05-07 [PTadmin] Header formatted for Contributor Agreement
// 0 !HISTORY 2008-07-01 [PTadmin] Official Update 2008-01
// 0 !HISTORY 2022-08-04 [MagFors] Using subfile
// 0 !HISTORY 2022-09-15 [PTadmin] Official Update 2022-05
// 
// 
// 1 16 0 0 0 1 0 0 0 1 0 0 0 1 s\3004s01.dat
  [1,16,0,0,0,1,0,0,0,1,0,0,0,1, ldraw_lib__s__3004s01(realsolid)],
// 4 16 -20 24 -10 20 24 -10 20 0 -10 -20 0 -10
  [4,16,-20,24,-10,20,24,-10,20,0,-10,-20,0,-10],
];
module ldraw_lib__3004(step=0, col=false, unit=2/5, alt=false, line=0.2, solid=!$preview)
    makepoly(ldraw_lib__3004(solid), step=step, col=col, unit=unit, alt=alt, line=line, solid=solid);
ldraw_lib__3004(line=0.2);
// file: 3005ptv.scad
use <../lib.scad>
use <s/3005s01.scad>
$fa=1; $fs=0.2;
function ldraw_lib__3005ptv(realsolid=false) = [
// 0 Brick  1 x  1 with Blue "V" Pattern
// 0 Name: 3005ptv.dat
// 0 Author: Tore Eriksson [Tore_Eriksson]
// 0 !LDRAW_ORG Part UPDATE 2015-01
// 0 !LICENSE Licensed under CC BY 2.0 and CC BY 4.0 : see CAreadme.txt
// 
// 0 BFC CERTIFY CCW
  [0,"BFC","CERTIFY"],
  [0,"BFC","CCW"],
// 
// 0 !HISTORY 2003-12-09 [Steffen] made use of existing subfile
// 0 !HISTORY 2004-04-22 [PTadmin] Official Update 2004-02
// 0 !HISTORY 2007-05-11 [PTadmin] Header formatted for Contributor Agreement
// 0 !HISTORY 2008-07-01 [PTadmin] Official Update 2008-01
// 0 !HISTORY 2014-12-26 [Holly-Wood] Fixed T-Junction, BFCed
// 0 !HISTORY 2015-10-11 [PTadmin] Official Update 2015-01
// 
// 
// 0 // Pattern
// 4 1 -5.5 5 -10 -1 19 -10 0 16 -10 -3.5 5 -10
  [4,1,-5.5,5,-10,-1,19,-10,0,16,-10,-3.5,5,-10],
// 3 1 0 16 -10 -1 19 -10 1 19 -10
  [3,1,0,16,-10,-1,19,-10,1,19,-10],
// 4 1 3.5 5 -10 0 16 -10 1 19 -10 5.5 5 -10
  [4,1,3.5,5,-10,0,16,-10,1,19,-10,5.5,5,-10],
// 4 16 -1 19 -10 -5.5 5 -10 -10 0 -10 -10 24 -10
  [4,16,-1,19,-10,-5.5,5,-10,-10,0,-10,-10,24,-10],
// 4 16 1 19 -10 -1 19 -10 -10 24 -10 10 24 -10
  [4,16,1,19,-10,-1,19,-10,-10,24,-10,10,24,-10],
// 4 16 5.5 5 -10 1 19 -10 10 24 -10 10 0 -10
  [4,16,5.5,5,-10,1,19,-10,10,24,-10,10,0,-10],
// 3 16 3.5 5 -10 -3.5 5 -10 0 16 -10
  [3,16,3.5,5,-10,-3.5,5,-10,0,16,-10],
// 3 16 10 0 -10 3.5 5 -10 5.5 5 -10
  [3,16,10,0,-10,3.5,5,-10,5.5,5,-10],
// 4 16 -10 0 -10 -3.5 5 -10 3.5 5 -10 10 0 -10
  [4,16,-10,0,-10,-3.5,5,-10,3.5,5,-10,10,0,-10],
// 3 16 -10 0 -10 -5.5 5 -10 -3.5 5 -10
  [3,16,-10,0,-10,-5.5,5,-10,-3.5,5,-10],
// 
// 0 // Subfile
// 1 16 0 0 0 1 0 0 0 1 0 0 0 1 s\3005s01.dat
  [1,16,0,0,0,1,0,0,0,1,0,0,0,1, ldraw_lib__s__3005s01(realsolid)],
];
module ldraw_lib__3005ptv(step=0, col=false, unit=2/5, alt=false, line=0.2, solid=!$preview)
    makepoly(ldraw_lib__3005ptv(solid), step=step, col=col, unit=unit, alt=alt, line=line, solid=solid);
ldraw_lib__3005ptv(line=0.2);
// main file
use <../lib.scad>
use <3005ptv.scad>
$fa=1; $fs=0.2;
function ldraw_lib__3005_v(realsolid=false) = [
// 0 ~Moved to 3005ptv
// 0 Name: 3005-v.dat
// 0 Author: [PTadmin]
// 0 !LDRAW_ORG Part UPDATE 2004-02
// 0 !LICENSE Licensed under CC BY 4.0 : see CAreadme.txt
// 
// 0 BFC CERTIFY CCW
  [0,"BFC","CERTIFY"],
  [0,"BFC","CCW"],
// 
// 0 !HISTORY 1998-12-15 [PTadmin] Official Update 1998-10
// 0 !HISTORY 2004-04-22 [PTadmin] Official Update 2004-02
// 0 !HISTORY 2007-05-11 [PTadmin] Header formatted for Contributor Agreement
// 0 !HISTORY 2008-07-01 [PTadmin] Official Update 2008-01
// 
// 
// 1 16 0 0 0 1 0 0 0 1 0 0 0 1 3005ptv.dat
  [1,16,0,0,0,1,0,0,0,1,0,0,0,1, ldraw_lib__3005ptv(realsolid)],
];
module ldraw_lib__3005_v(step=0, col=false, unit=2/5, alt=false, line=0.2, solid=!$preview)
    makepoly(ldraw_lib__3005_v(solid), step=step, col=col, unit=unit, alt=alt, line=line, solid=solid);
ldraw_lib__3005_v(line=0.2);
